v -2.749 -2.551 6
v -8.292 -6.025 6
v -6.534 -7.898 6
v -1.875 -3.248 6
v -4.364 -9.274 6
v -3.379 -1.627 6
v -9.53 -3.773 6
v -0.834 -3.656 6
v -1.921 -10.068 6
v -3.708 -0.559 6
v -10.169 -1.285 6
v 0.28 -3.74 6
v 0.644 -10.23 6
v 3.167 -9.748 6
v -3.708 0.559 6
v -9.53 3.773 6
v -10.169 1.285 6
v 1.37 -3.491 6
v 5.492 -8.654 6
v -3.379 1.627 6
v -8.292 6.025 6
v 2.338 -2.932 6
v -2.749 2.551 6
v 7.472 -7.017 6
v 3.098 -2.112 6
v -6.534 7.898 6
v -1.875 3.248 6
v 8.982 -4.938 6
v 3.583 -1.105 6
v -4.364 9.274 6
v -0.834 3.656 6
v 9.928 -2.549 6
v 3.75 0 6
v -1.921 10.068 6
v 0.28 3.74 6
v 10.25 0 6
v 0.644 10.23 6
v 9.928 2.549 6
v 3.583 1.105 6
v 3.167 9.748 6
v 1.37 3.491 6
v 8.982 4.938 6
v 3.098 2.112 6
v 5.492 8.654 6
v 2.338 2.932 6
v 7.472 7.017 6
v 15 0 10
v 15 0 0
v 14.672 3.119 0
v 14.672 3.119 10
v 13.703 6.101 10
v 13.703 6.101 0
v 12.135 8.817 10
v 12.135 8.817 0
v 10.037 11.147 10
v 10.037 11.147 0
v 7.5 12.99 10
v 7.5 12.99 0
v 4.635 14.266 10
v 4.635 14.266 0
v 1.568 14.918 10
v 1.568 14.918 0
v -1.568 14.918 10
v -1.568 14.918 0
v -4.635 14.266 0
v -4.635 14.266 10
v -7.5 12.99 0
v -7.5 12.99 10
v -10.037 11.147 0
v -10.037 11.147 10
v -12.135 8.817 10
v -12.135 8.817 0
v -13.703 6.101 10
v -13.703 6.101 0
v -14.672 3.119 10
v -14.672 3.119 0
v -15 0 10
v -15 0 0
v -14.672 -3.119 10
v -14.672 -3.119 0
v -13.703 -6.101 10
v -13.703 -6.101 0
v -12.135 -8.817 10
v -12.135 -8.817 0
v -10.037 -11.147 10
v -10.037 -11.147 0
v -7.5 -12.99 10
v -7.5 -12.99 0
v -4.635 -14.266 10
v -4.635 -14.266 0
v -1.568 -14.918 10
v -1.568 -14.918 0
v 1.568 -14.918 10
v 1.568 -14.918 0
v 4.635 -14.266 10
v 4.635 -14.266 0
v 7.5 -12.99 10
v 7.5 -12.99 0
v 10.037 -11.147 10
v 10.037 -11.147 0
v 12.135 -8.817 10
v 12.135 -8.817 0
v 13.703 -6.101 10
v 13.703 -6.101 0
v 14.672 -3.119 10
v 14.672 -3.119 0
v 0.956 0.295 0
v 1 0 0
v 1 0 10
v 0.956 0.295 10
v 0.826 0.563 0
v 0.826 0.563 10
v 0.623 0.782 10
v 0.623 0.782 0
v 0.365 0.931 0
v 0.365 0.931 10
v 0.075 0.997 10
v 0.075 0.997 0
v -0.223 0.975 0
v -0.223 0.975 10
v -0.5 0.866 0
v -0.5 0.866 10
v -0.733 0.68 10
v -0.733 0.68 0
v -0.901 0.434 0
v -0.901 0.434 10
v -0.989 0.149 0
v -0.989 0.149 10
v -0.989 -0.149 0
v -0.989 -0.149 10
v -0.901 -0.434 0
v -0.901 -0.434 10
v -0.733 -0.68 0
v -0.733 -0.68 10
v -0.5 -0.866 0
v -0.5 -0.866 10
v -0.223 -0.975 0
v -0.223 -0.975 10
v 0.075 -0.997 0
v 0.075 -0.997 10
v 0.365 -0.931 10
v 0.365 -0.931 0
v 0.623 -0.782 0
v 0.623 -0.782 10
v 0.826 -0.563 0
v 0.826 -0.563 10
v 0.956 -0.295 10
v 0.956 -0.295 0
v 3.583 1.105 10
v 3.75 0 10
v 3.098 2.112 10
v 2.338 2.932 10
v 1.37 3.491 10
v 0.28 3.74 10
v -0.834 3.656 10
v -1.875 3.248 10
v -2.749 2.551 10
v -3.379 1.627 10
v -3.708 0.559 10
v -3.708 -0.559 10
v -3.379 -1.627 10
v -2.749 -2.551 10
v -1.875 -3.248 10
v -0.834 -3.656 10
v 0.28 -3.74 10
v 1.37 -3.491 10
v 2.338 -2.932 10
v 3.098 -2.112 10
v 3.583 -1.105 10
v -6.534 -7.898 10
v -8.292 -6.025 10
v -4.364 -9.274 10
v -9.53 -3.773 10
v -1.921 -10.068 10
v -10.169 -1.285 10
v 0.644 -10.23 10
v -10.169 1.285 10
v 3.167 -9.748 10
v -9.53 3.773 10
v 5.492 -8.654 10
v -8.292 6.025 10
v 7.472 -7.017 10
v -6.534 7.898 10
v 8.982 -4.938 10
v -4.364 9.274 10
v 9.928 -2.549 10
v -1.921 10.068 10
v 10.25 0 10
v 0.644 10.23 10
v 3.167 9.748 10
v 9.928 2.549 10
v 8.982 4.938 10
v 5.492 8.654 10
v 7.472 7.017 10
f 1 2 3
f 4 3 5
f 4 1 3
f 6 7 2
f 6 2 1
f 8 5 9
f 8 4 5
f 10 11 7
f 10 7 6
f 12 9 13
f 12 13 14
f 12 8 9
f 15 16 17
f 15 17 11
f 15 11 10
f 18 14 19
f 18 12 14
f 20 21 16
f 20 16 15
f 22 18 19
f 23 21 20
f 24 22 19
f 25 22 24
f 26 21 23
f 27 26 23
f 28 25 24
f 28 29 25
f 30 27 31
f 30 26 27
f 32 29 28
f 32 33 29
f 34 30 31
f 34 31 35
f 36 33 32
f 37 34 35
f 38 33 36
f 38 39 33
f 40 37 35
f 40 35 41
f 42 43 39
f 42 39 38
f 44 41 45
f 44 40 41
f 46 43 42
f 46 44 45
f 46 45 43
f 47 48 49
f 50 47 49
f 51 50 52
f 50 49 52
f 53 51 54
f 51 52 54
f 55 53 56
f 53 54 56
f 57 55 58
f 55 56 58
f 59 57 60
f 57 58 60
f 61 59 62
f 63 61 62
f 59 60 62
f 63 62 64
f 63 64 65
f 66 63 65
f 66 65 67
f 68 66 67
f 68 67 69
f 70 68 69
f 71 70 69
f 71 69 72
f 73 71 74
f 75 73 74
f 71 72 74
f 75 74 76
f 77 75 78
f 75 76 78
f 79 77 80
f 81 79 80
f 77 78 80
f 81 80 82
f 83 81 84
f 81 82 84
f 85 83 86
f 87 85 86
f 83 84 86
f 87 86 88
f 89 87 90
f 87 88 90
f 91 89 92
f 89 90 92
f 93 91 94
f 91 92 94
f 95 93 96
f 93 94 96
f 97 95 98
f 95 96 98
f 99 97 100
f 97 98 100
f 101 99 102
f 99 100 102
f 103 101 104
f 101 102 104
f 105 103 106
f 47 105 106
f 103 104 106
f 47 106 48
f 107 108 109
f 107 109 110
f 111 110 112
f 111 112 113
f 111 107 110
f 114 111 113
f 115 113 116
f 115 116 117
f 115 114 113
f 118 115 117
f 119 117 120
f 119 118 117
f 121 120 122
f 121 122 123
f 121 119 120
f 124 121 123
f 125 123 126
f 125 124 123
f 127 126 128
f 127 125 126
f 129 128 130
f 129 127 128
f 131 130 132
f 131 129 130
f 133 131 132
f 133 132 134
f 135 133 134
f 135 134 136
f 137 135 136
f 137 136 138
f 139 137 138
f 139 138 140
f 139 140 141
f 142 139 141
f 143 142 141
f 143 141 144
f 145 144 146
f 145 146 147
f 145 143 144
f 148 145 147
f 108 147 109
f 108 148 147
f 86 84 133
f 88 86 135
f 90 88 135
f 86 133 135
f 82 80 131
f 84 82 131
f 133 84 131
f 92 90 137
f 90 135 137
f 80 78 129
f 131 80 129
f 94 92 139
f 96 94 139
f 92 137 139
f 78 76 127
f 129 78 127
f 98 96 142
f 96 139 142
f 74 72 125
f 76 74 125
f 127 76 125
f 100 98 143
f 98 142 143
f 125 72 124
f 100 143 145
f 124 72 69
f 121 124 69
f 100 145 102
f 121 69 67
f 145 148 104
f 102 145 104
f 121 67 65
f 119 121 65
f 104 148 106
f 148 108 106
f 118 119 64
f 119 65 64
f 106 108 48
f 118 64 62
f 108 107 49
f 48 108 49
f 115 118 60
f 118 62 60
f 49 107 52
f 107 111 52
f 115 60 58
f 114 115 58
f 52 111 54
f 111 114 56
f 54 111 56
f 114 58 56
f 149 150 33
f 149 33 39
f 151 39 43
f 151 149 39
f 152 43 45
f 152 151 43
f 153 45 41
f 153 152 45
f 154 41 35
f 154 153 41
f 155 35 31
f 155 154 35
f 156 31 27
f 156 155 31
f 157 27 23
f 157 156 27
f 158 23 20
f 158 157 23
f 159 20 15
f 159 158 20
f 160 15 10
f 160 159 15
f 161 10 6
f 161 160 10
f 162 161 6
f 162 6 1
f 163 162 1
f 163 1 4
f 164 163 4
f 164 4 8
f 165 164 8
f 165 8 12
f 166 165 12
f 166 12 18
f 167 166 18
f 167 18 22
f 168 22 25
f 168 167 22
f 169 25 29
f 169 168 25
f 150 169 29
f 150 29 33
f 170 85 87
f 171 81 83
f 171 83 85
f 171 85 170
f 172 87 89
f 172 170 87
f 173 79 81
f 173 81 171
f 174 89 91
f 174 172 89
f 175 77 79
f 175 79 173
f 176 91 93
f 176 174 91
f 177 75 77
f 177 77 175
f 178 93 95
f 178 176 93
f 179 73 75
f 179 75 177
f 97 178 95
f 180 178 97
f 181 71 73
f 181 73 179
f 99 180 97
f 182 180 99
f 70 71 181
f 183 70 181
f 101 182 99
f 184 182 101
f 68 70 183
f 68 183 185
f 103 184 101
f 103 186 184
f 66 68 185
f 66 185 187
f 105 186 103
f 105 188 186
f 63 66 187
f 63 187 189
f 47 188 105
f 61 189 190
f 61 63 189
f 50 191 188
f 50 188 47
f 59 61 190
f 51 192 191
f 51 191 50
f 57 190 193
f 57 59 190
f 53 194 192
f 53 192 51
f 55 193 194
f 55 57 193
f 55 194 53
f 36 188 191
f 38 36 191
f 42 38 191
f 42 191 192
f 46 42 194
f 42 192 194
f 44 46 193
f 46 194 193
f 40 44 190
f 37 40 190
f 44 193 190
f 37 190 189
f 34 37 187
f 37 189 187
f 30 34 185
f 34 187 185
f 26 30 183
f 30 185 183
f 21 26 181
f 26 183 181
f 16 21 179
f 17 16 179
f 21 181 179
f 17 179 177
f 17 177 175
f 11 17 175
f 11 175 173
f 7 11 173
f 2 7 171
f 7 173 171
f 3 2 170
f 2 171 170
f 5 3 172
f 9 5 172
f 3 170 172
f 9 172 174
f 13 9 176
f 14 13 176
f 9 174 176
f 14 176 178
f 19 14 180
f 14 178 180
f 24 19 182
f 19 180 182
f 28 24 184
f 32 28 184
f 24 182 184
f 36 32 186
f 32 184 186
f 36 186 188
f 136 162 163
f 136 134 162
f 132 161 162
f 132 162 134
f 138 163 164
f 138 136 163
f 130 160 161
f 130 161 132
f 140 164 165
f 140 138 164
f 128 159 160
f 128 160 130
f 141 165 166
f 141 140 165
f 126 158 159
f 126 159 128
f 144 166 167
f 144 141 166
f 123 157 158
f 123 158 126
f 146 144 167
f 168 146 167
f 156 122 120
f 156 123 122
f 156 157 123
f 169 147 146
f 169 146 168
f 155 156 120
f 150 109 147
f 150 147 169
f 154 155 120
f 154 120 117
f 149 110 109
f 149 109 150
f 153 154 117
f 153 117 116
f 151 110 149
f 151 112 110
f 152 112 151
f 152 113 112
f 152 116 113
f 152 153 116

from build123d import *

# Parameters (mm, degrees)
ESBO_O1_R                = 15
ESBO_O1_R_2              = 1
RESSALTO_EXTRUS_O1_DEPTH = 10
ESBO_O2_R                = 10.25
ESBO_O2_R_2              = 3.75
CORTE_EXTRUS_O1_DEPTH    = 4


with BuildPart() as part:
    # Esboço1 → Ressalto-extrusão1 (new body)
    with BuildSketch(Plane.XY):
        Circle(ESBO_O1_R)
        Circle(ESBO_O1_R_2, mode=Mode.SUBTRACT)
    extrude(amount=RESSALTO_EXTRUS_O1_DEPTH)

    # Esboço2 → Corte-extrusão1 (cut)
    with BuildSketch(Plane.XY.offset(10)):
        Circle(ESBO_O2_R)
        Circle(ESBO_O2_R_2, mode=Mode.SUBTRACT)
    extrude(amount=-CORTE_EXTRUS_O1_DEPTH, mode=Mode.SUBTRACT)


solid = part.part
